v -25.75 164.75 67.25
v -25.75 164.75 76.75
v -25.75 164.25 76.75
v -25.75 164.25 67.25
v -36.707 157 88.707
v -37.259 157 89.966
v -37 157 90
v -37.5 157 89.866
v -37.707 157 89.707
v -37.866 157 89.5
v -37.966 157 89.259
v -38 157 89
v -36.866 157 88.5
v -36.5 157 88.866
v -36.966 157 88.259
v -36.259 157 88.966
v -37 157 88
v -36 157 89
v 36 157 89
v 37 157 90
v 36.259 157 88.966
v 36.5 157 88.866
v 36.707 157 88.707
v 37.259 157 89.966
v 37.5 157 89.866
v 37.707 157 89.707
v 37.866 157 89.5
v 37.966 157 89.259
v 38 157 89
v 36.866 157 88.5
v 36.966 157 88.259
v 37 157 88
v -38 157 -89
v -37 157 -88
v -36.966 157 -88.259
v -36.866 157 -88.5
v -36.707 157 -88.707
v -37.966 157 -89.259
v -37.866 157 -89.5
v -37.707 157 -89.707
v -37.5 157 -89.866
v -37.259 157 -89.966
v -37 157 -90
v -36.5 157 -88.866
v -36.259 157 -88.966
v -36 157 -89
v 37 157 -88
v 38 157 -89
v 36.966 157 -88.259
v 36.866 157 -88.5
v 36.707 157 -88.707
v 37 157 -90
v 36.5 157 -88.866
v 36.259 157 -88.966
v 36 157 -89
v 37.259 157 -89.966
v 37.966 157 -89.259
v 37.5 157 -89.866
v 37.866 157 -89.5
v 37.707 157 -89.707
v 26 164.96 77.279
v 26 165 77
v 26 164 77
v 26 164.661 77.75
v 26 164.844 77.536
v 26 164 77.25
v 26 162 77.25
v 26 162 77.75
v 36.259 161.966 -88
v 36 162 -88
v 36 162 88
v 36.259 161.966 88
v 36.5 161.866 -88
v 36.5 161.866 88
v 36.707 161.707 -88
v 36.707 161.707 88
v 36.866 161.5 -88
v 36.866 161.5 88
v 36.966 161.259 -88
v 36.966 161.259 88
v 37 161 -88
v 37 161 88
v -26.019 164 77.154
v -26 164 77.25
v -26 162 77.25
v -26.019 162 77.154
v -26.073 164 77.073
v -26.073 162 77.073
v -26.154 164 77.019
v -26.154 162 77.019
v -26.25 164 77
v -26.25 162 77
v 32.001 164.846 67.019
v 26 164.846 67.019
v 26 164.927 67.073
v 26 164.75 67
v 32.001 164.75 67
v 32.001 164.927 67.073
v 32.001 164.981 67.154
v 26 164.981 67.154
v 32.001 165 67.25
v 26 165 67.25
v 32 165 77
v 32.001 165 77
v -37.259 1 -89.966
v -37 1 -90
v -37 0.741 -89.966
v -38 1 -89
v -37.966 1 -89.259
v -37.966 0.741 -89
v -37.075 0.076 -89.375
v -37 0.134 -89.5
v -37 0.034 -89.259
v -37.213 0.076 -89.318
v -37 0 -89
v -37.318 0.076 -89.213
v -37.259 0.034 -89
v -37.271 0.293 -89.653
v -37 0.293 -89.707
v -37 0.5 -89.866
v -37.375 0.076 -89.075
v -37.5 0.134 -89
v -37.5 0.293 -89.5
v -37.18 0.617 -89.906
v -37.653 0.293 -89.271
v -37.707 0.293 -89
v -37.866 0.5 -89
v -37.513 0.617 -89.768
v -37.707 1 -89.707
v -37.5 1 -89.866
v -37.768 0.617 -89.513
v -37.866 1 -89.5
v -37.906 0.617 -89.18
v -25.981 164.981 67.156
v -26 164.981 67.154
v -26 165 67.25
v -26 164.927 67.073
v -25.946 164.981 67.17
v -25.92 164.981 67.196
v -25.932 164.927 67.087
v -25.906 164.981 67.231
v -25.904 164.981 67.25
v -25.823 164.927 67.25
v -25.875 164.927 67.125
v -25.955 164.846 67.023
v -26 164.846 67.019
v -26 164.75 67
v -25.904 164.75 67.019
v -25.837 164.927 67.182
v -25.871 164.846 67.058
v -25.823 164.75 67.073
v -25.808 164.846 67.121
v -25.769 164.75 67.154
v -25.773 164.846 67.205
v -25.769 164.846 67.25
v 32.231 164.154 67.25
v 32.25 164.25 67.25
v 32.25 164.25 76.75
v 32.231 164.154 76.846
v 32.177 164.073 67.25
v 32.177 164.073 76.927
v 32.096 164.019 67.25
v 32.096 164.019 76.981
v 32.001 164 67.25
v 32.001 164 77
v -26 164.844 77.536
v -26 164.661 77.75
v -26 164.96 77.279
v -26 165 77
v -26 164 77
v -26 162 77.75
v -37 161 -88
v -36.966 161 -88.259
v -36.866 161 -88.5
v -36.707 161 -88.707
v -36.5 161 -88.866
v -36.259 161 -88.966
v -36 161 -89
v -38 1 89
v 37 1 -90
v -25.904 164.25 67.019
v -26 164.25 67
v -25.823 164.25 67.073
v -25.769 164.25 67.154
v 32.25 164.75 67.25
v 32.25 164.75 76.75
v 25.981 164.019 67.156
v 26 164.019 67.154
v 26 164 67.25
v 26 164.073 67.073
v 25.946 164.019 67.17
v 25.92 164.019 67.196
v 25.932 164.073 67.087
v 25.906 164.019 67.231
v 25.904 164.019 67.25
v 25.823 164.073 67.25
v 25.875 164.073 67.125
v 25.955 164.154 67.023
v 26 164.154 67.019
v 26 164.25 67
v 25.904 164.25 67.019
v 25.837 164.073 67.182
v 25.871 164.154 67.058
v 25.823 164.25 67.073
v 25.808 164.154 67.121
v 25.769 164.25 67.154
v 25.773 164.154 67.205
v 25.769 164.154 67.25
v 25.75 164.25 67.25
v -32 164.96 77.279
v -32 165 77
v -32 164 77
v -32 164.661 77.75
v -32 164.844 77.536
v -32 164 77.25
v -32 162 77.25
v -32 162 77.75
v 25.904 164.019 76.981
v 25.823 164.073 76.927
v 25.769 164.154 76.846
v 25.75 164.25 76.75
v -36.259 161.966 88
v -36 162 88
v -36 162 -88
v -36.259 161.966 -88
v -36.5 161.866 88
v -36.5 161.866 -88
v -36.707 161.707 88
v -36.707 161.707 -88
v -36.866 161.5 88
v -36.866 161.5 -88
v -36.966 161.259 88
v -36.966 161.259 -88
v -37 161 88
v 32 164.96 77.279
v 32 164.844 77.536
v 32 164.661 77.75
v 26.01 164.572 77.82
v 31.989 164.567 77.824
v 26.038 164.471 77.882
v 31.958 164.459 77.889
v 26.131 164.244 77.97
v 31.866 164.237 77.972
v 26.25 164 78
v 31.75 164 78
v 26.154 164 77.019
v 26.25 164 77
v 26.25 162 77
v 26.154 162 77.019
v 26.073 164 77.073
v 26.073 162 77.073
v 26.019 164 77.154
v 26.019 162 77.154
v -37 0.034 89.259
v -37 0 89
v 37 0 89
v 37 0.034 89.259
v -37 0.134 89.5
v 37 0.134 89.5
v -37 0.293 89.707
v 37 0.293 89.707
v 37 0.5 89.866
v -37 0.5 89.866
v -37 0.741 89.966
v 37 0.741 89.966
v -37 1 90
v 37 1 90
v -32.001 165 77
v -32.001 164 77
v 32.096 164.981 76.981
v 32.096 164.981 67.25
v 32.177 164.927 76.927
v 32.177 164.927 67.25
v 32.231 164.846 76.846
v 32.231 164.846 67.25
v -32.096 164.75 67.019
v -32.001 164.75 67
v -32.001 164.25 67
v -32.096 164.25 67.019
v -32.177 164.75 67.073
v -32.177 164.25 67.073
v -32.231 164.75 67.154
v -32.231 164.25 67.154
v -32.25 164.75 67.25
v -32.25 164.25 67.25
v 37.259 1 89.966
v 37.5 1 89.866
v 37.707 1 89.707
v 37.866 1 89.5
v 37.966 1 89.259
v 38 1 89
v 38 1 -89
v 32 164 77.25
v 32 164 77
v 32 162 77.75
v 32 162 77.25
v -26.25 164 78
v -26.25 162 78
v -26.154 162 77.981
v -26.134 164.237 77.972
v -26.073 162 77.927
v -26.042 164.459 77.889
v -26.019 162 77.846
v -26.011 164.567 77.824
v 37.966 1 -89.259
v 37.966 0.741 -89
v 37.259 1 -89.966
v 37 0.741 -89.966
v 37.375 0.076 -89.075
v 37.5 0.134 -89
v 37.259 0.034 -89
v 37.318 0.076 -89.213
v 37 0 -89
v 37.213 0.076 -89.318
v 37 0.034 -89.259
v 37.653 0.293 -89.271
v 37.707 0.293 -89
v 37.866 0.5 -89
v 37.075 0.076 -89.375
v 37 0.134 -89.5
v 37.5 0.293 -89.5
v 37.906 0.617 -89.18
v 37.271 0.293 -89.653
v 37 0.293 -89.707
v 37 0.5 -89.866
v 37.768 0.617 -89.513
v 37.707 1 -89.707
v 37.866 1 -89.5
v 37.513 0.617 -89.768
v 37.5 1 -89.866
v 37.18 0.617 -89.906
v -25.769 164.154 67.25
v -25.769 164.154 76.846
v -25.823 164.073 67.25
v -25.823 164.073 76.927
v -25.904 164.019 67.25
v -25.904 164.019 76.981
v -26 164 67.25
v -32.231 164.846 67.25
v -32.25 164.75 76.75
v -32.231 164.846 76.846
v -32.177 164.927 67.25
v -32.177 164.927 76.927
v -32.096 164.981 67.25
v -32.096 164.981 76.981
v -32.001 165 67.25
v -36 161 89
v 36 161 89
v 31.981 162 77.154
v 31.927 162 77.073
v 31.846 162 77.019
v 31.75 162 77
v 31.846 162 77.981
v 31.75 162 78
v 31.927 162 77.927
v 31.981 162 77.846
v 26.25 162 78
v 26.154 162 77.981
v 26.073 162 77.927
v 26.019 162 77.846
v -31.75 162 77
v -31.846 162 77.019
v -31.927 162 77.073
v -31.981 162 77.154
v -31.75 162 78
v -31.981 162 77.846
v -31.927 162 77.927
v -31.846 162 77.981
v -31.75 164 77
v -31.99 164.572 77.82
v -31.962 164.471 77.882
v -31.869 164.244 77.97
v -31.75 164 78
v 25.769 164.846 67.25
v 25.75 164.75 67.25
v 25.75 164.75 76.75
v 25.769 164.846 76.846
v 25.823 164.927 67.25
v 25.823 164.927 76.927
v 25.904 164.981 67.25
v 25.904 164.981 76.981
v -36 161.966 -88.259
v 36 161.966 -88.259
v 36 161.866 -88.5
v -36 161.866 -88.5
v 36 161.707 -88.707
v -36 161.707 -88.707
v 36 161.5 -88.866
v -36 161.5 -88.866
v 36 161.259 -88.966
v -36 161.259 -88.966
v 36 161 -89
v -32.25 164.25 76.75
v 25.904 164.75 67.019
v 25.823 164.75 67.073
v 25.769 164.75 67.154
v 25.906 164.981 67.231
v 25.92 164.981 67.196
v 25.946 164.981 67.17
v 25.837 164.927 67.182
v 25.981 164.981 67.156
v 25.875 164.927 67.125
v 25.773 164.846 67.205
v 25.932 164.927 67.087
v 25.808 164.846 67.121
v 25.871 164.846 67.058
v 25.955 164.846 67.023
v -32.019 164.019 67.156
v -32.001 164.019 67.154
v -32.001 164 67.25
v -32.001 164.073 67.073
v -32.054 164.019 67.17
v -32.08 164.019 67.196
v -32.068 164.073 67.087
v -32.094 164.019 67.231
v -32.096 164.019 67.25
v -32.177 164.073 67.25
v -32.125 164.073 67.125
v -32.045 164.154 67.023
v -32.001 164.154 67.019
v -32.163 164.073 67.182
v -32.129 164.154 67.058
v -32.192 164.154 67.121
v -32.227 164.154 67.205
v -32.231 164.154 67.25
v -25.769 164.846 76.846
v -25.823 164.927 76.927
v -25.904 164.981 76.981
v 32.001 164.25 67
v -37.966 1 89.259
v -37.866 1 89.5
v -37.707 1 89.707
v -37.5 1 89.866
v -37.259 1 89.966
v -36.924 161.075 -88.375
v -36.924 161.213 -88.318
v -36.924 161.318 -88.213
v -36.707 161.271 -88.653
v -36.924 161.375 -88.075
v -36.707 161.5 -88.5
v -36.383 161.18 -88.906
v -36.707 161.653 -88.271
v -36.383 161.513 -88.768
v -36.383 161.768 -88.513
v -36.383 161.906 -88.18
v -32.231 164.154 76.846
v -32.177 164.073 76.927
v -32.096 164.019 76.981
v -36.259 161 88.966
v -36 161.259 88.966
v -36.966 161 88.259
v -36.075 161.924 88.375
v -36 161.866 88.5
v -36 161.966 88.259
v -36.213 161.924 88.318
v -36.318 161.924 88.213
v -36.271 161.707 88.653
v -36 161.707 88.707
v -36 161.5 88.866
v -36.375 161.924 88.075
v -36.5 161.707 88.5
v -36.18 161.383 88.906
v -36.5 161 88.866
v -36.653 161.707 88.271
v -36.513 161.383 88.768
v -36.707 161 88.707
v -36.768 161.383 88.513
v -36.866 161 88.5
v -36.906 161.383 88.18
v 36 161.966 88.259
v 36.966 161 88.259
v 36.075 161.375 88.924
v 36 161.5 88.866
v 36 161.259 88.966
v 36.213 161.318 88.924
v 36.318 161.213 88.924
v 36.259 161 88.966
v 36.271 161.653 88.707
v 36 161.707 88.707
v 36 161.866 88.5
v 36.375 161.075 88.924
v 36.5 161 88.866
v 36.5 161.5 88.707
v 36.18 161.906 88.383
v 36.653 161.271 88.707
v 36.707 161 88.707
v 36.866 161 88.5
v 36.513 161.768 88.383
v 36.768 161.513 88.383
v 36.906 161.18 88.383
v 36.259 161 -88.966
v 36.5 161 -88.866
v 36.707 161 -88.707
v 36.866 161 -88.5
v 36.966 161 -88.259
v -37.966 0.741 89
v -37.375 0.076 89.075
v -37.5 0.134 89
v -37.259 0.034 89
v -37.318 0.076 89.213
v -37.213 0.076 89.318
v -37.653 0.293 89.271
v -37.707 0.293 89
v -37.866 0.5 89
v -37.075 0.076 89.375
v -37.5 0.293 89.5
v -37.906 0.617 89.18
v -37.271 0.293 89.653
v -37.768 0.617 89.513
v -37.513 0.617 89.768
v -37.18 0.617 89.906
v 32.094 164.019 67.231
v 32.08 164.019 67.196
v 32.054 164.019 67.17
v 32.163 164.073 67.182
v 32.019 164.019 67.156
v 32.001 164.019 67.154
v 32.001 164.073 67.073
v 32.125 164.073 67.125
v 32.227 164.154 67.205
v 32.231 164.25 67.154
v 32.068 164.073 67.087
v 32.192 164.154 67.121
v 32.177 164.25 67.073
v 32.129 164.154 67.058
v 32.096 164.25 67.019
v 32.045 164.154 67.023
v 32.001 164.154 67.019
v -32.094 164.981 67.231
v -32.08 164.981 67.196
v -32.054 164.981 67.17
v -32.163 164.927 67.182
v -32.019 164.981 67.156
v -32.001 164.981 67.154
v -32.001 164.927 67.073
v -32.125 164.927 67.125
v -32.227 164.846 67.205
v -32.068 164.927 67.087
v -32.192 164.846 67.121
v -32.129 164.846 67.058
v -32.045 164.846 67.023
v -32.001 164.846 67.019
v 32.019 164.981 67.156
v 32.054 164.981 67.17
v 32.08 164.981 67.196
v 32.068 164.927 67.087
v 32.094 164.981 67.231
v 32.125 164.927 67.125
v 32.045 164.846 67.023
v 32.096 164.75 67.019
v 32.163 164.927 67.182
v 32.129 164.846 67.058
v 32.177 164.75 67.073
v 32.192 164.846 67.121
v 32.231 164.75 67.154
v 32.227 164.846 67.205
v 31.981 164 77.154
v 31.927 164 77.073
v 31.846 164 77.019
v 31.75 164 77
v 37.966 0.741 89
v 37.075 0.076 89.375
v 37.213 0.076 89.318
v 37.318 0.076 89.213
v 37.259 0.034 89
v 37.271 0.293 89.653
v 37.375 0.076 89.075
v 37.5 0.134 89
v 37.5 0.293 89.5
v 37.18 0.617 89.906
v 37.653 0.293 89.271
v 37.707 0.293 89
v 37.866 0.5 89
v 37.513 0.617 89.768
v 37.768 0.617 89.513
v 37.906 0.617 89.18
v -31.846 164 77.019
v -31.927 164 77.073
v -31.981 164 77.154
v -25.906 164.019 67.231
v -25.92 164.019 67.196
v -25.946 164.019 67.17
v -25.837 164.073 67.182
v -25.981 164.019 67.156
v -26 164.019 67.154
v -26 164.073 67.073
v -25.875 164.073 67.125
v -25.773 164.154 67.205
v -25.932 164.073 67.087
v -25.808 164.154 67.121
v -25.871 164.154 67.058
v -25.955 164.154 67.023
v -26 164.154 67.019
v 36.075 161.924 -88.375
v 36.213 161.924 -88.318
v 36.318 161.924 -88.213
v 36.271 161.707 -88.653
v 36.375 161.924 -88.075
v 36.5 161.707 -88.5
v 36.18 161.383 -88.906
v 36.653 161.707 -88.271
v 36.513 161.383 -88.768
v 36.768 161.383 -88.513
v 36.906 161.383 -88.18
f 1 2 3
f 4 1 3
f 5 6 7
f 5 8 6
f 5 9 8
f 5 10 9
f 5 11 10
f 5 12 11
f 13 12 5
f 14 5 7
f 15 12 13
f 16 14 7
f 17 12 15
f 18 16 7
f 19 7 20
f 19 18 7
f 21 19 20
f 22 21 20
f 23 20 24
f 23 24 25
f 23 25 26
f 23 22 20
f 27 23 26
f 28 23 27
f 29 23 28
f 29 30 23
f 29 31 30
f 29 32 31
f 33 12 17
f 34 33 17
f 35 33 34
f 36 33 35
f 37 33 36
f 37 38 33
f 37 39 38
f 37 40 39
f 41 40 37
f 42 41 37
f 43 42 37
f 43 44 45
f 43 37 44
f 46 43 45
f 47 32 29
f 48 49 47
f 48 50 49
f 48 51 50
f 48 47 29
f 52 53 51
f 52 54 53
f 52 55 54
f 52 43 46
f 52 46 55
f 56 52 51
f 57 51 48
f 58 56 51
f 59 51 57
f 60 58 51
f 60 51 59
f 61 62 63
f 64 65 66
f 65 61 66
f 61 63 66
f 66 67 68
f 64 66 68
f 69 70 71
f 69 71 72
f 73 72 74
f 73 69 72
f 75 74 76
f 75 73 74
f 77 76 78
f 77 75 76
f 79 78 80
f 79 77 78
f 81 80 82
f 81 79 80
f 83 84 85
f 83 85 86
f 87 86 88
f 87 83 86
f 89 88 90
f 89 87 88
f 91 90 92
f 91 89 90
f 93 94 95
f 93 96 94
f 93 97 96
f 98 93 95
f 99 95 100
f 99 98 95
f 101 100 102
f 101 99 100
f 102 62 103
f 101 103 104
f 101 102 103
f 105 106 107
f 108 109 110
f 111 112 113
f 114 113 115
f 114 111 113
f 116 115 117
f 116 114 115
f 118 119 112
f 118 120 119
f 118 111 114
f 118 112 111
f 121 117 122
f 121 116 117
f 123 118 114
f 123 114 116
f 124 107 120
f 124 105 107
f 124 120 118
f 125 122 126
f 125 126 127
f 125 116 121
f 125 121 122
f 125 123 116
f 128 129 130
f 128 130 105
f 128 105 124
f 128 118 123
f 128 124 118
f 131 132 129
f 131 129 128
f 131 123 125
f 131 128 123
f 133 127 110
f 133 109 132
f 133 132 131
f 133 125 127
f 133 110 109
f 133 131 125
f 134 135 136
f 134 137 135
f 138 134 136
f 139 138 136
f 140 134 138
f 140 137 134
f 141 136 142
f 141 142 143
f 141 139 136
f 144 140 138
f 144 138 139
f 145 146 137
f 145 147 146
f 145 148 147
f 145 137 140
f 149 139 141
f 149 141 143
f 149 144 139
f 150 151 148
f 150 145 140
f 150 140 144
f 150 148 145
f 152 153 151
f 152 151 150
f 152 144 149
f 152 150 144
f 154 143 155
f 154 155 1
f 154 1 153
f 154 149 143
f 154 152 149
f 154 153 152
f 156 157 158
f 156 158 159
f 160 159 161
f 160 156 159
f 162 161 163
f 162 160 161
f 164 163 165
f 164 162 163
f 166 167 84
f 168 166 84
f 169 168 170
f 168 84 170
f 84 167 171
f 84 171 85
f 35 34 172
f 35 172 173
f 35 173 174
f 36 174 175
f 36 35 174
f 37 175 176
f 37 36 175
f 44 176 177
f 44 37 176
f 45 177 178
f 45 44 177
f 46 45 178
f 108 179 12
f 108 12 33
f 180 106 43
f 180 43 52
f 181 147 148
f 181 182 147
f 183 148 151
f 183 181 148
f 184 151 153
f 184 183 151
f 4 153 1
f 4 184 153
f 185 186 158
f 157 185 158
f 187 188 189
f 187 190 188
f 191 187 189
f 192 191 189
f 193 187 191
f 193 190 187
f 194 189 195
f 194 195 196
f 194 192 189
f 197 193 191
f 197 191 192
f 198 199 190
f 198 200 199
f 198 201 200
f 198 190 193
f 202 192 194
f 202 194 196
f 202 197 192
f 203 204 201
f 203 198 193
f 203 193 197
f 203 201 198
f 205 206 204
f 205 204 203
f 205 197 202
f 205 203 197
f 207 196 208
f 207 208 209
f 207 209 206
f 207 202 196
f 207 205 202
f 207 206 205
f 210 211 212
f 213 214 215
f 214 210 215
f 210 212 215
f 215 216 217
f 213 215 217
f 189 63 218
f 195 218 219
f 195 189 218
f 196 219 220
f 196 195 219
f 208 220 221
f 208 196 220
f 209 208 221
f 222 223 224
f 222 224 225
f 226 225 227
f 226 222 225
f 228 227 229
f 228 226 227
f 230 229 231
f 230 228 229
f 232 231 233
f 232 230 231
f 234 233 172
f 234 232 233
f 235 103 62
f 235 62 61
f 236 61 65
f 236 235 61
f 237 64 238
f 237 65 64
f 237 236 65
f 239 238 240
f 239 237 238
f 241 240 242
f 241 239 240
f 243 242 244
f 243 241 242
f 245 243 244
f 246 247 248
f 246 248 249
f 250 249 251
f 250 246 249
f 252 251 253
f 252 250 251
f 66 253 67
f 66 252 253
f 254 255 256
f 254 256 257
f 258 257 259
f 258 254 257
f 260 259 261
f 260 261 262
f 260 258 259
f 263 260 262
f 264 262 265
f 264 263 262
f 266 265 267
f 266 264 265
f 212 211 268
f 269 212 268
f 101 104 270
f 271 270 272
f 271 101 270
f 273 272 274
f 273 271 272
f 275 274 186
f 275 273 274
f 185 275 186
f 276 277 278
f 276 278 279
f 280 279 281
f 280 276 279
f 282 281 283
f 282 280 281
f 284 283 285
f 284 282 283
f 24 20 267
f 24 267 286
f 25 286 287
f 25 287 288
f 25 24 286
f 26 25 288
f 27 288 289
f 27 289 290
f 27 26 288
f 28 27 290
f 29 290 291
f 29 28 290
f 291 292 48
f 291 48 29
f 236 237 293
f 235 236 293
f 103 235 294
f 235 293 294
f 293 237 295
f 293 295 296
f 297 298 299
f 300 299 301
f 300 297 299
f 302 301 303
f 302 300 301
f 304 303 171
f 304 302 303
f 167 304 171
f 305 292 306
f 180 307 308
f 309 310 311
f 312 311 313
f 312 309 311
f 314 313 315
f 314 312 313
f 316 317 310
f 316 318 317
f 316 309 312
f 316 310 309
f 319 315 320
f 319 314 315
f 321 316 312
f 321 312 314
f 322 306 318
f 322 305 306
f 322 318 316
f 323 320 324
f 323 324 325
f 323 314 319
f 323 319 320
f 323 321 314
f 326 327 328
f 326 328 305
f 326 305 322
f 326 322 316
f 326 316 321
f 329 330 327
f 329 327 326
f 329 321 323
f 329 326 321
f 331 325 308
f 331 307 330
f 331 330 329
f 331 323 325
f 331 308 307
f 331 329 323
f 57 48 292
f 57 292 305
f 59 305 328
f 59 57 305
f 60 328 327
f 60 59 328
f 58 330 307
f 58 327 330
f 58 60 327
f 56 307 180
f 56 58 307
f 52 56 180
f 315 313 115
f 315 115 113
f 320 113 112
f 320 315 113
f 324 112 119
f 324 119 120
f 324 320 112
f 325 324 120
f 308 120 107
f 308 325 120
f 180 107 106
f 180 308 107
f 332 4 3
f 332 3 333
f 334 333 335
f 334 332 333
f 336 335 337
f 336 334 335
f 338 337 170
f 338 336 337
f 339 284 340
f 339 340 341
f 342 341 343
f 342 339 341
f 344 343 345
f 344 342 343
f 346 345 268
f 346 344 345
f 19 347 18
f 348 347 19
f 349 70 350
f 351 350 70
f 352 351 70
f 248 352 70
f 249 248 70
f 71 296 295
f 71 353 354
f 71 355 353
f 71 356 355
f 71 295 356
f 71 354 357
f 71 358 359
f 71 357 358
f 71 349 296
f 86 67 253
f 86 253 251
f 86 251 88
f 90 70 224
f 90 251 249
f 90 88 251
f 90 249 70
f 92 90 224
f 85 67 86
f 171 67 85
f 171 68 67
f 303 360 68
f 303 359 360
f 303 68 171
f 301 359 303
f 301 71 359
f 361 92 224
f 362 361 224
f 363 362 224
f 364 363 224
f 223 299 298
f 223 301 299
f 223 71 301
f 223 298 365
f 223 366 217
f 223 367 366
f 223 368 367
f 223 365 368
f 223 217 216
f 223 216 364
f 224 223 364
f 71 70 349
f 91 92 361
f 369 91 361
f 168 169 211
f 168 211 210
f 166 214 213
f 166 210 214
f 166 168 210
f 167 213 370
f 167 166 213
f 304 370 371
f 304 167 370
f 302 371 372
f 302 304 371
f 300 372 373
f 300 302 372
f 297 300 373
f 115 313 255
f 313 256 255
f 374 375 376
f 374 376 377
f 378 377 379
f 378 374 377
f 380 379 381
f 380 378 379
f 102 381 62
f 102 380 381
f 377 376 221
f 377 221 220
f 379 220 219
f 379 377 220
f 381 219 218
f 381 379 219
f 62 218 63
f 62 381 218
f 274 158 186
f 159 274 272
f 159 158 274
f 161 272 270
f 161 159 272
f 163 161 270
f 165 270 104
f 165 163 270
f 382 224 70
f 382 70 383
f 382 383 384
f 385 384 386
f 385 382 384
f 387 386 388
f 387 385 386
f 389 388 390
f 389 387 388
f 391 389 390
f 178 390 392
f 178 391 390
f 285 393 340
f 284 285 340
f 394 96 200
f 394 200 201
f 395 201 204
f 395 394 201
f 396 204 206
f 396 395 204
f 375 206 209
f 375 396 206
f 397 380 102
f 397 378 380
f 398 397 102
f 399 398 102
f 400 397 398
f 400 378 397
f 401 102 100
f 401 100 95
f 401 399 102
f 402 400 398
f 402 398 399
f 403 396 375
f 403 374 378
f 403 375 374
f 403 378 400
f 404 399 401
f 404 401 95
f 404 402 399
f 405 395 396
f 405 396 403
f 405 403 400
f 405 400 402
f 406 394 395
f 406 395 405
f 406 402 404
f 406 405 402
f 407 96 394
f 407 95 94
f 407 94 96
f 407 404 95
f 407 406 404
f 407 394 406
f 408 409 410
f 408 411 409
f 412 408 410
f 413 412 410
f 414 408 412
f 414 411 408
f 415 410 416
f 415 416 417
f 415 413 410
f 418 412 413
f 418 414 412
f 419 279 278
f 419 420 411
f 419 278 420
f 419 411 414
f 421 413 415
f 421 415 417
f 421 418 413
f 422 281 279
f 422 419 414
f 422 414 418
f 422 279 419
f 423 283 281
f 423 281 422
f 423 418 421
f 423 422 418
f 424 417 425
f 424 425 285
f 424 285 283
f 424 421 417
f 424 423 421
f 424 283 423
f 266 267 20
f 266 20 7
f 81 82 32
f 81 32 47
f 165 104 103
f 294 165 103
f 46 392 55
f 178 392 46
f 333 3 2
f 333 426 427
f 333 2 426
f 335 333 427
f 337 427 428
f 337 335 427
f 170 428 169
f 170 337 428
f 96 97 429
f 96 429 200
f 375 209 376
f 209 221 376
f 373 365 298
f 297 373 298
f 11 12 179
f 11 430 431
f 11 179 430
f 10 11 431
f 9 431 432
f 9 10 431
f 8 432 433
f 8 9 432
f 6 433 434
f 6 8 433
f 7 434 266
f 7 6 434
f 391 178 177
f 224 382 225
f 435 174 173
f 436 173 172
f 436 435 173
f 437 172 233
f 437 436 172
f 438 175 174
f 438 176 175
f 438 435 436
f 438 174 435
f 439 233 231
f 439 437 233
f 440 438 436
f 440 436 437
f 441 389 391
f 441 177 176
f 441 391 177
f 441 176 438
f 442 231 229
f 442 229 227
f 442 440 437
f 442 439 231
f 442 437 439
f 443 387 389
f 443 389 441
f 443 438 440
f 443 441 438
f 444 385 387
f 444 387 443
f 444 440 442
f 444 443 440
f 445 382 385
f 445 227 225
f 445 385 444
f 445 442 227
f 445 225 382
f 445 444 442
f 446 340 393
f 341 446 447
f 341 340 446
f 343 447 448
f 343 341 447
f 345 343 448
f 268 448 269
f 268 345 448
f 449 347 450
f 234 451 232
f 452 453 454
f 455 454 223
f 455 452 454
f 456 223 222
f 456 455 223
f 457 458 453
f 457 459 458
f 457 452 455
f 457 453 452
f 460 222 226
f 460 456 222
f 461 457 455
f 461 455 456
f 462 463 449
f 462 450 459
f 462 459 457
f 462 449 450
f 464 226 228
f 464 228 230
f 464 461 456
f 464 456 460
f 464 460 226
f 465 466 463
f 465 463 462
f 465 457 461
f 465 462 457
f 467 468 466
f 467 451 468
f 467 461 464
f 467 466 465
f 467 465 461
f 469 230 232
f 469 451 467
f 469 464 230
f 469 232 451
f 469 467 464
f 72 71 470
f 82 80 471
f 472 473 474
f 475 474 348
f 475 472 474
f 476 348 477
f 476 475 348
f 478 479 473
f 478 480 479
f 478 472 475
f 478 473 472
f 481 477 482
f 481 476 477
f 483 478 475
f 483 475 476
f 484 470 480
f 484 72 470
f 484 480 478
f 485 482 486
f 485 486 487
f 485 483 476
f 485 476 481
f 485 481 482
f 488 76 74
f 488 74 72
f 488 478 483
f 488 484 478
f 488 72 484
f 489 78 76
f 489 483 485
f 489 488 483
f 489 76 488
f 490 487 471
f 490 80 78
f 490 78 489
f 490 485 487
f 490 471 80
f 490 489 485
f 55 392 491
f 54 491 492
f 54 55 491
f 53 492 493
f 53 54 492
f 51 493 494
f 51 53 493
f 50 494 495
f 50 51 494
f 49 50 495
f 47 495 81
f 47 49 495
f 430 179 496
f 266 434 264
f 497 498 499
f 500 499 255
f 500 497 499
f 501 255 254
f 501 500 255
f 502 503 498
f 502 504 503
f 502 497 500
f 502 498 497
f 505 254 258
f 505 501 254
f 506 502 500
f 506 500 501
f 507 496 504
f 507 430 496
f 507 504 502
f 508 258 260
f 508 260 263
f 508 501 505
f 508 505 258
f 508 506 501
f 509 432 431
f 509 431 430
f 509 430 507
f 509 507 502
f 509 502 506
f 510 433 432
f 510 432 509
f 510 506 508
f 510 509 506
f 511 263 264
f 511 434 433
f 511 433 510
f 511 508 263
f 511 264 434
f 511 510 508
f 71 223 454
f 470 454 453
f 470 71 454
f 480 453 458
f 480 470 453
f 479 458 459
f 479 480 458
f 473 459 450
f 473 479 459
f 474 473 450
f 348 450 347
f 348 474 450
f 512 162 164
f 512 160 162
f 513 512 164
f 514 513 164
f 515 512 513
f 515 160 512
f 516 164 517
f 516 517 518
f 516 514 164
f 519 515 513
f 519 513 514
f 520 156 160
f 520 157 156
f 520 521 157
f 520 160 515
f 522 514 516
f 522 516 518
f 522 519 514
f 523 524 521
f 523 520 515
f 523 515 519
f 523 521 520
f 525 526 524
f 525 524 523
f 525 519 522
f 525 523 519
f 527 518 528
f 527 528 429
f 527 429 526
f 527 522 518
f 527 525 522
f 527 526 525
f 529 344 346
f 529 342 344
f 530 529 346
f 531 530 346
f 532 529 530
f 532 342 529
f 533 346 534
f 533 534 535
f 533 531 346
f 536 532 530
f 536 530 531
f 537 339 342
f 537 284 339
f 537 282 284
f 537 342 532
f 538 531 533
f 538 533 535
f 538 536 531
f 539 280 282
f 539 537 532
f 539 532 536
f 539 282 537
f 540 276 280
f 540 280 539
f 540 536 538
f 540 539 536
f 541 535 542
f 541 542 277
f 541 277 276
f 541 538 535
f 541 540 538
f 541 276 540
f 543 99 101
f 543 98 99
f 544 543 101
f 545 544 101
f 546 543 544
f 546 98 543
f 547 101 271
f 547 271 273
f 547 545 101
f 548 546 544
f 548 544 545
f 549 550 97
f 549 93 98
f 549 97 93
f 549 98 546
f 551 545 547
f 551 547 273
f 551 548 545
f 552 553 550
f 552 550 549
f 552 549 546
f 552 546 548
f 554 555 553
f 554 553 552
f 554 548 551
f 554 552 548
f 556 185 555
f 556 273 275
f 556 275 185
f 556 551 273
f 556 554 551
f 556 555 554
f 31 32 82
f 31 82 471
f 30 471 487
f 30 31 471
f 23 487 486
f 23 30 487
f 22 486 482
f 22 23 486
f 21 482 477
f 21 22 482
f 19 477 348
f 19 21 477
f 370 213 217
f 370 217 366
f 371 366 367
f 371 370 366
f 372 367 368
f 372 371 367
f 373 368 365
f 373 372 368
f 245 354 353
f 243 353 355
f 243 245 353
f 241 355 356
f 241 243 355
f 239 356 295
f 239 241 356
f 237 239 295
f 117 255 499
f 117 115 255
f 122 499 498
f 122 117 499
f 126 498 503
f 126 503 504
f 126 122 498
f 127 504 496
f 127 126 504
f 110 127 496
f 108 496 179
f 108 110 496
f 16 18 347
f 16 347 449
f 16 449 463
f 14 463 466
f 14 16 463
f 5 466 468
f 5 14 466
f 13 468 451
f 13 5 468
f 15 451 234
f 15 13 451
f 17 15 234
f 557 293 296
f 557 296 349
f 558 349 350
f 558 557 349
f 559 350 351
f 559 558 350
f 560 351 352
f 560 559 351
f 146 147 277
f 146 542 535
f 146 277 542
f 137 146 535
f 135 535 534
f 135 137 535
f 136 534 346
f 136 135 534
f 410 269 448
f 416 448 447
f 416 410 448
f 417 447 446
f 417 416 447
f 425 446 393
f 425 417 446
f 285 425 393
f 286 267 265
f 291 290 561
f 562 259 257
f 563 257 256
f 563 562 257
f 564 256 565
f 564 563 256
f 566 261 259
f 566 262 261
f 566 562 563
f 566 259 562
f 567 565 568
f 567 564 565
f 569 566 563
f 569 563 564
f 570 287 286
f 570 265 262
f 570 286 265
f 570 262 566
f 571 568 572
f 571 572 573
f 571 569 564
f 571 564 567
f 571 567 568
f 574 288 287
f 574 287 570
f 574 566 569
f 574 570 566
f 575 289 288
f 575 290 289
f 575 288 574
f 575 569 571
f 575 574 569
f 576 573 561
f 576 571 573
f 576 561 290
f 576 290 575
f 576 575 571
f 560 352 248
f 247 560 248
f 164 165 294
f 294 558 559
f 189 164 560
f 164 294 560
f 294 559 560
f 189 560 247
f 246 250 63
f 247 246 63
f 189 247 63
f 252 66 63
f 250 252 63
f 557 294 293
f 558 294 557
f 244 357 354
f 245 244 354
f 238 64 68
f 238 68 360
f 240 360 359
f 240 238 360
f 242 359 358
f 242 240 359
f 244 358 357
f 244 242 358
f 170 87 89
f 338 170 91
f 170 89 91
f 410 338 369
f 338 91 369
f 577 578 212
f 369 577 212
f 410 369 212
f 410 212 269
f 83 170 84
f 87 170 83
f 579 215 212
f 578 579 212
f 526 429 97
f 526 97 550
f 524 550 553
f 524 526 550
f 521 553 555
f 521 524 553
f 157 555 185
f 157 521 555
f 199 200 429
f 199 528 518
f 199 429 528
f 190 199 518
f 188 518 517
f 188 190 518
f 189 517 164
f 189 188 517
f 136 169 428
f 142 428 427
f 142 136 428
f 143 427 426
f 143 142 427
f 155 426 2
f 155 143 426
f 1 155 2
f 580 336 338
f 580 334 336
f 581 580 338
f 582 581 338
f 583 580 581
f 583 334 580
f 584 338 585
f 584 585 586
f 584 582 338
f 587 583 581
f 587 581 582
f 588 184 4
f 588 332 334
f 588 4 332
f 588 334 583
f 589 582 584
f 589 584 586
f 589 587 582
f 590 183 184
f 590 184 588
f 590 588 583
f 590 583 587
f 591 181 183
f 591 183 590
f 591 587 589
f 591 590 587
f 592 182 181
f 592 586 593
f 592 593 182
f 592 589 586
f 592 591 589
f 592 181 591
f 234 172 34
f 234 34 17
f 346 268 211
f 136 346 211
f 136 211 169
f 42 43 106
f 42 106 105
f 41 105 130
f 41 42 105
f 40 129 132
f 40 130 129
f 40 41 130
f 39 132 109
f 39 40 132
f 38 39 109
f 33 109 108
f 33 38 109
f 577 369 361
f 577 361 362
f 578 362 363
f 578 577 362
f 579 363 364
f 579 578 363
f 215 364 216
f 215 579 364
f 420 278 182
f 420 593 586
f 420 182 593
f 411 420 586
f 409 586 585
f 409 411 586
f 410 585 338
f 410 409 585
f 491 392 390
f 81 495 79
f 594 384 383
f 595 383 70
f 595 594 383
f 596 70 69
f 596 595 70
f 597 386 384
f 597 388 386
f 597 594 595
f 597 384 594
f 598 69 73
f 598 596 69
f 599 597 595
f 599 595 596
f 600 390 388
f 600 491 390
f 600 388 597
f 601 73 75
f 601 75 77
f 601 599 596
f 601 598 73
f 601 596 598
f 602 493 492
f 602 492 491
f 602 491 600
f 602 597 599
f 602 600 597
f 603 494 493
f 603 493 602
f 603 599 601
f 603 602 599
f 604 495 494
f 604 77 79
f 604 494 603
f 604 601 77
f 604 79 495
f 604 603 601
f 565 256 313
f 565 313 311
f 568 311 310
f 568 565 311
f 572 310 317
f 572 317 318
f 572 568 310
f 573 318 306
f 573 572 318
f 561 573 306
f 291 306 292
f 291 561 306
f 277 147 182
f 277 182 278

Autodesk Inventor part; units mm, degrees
ref_plane "YZ Plane" through (0, 0, 0) normal (1, 0, 0) x (0, 1, 0)
ref_plane "XZ Plane" through (0, 0, 0) normal (0, 1, 0) x (-1, 0, 0)
ref_plane "XY Plane" through (0, 0, 0) normal (0, 0, 1) x (1, 0, 0)
sketch "Sketch1" plane through (0, 0, 0) normal (0, 1, 0) x (-1, 0, 0)
  line L0 (-38, 90) -> (38, 90)
  line L1 (38, 90) -> (38, -90)
  line L2 (38, -90) -> (-38, -90)
  line L3 (-38, -90) -> (-38, 90)
  line L4 (-38, 90) -> (38, -90) construction
  line L5 (38, 90) -> (-38, -90) construction
  point P0 (0, 0)
  dimension "d0" = 76
  dimension "d1" = 180
extrude "Extrusion1" add sketch "Sketch1" along normal blind 162
sketch "Sketch2" plane through (0, 162, 0) normal (0, 1, 0) x (1, 0, 0)
  line L0 (-38, -90) -> (38, -90) construction
  line L1 (38, -90) -> (38, 90) construction
  line L2 (38, 90) -> (-38, 90) construction
  line L3 (-38, 90) -> (-38, -90) construction
  line L4 (-37, -89) -> (37, -89)
  line L5 (37, -89) -> (37, 89)
  line L6 (37, 89) -> (-37, 89)
  line L7 (-37, 89) -> (-37, -89)
  line L8 (-38, 90) -> (-38, -90) projected
  line L9 (-38, -90) -> (38, -90)
  line L10 (38, -90) -> (38, 90)
  line L11 (38, 90) -> (-38, 90)
  line L12 (-38, 90) -> (-38, -90)
  point P0 (0, 0)
  dimension "d4" = 1
extrude "Extrusion2" cut sketch "Sketch2" against normal blind 5
fillet "Fillet1" radius 1 16 edges at (38, 78.5, -90) (38, 78.5, 90) (-38, 78.5, -90) (-38, 78.5, 90) (0, 0, 90) (-38, 0, 0) (0, 0, -90) (38, 0, 0) (37, 159.5, -89) (37, 162, 0) (0, 162, -89) (37, 159.5, 89) (-37, 159.5, 89) (0, 162, 89) (-37, 162, 0) (-37, 159.5, -89)
sketch "Sketch3" plane through (0, 162, 0) normal (0, 1, 0) x (1, 0, 0)
  line L0 (37, -88) -> (37, 88) construction
  line L1 (-36, -89) -> (36, -89) construction
  line L2 (-37, 88) -> (-37, -88) construction
  line L3 (-32, -78) -> (-26, -78)
  line L4 (-26, -78) -> (-26, -77)
  line L5 (-26, -77) -> (-32, -77)
  line L6 (-32, -77) -> (-32, -78)
  line L7 (-32, -78) -> (-26, -77) construction
  line L8 (-26, -78) -> (-32, -77) construction
  line L9 (26, -78) -> (32, -78)
  line L10 (32, -78) -> (32, -77)
  line L11 (32, -77) -> (26, -77)
  line L12 (26, -77) -> (26, -78)
  line L13 (26, -78) -> (32, -77) construction
  line L14 (32, -78) -> (26, -77) construction
  point P0 (0, 0)
  point P1 (-29, -77.5)
  point P2 (29, -77.5)
  dimension "d12" = 6
  dimension "d13" = 1
  dimension "d14" = 6
  dimension "d15" = 1
  dimension "d16" = 11
  dimension "d17" = 5
  dimension "d18" = 5
  dimension "d19" = 11
extrude "Extrusion3" add sketch "Sketch3" along normal blind 3
sketch "Sketch4" plane through (32, 162, 77) normal (0, 0, -1) x (-1, 0, 0)
  line L0 (-0.25, 2) -> (6.25, 2)
  line L1 (6.25, 2) -> (6.25, 3)
  line L2 (6.25, 3) -> (-0.25, 3)
  line L3 (-0.25, 3) -> (-0.25, 2)
  line L4 (-0.25, 2) -> (6.25, 3) construction
  line L5 (6.25, 2) -> (-0.25, 3) construction
  line L6 (0, 3) -> (6, 3) construction
  line L7 (57.75, 2) -> (64.25, 2)
  line L8 (64.25, 2) -> (64.25, 3)
  line L9 (64.25, 3) -> (57.75, 3)
  line L10 (57.75, 3) -> (57.75, 2)
  line L11 (57.75, 2) -> (64.25, 3) construction
  line L12 (64.25, 2) -> (57.75, 3) construction
  line L13 (58, 3) -> (64, 3) construction
  point P0 (32, -162)
  point P1 (3, 2.5)
  point P2 (3, 3)
  point P3 (61, 2.5)
  point P4 (61, 3)
  dimension "d22" = 6.5
  dimension "d23" = 1
  dimension "d24" = 6.5
  dimension "d25" = 1
extrude "Extrusion4" add sketch "Sketch4" along normal blind 10
fillet "Fillet2" radius 0.25 28 edges at (32.25, 164.5, 67) (25.75, 164.5, 67) (32.25, 164.5, 77) (25.75, 164.5, 77) (-25.75, 164.5, 67) (-25.75, 164.5, 77) (-32.25, 164.5, 67) (-32.25, 164.5, 77) (-32.25, 165, 72) (-32.25, 164, 72) (-29, 165, 67) (-29, 164, 67) (-25.75, 164, 72) (-25.75, 165, 72) (-26, 163, 77) (-26, 163.5, 78) (-32, 163, 77) (-32, 163.5, 78) (32.25, 165, 72) (32.25, 164, 72) (32, 163, 77) (32, 163.5, 78) (29, 165, 67) (29, 164, 67) (25.75, 165, 72) (25.75, 164, 72) (26, 163, 77) (26, 163.5, 78)
fillet "Fillet2" radius 1 2 edges at (29, 165, 78) (-29, 165, 78)
properties part number "NP18-12 Battery" material "Copper"
